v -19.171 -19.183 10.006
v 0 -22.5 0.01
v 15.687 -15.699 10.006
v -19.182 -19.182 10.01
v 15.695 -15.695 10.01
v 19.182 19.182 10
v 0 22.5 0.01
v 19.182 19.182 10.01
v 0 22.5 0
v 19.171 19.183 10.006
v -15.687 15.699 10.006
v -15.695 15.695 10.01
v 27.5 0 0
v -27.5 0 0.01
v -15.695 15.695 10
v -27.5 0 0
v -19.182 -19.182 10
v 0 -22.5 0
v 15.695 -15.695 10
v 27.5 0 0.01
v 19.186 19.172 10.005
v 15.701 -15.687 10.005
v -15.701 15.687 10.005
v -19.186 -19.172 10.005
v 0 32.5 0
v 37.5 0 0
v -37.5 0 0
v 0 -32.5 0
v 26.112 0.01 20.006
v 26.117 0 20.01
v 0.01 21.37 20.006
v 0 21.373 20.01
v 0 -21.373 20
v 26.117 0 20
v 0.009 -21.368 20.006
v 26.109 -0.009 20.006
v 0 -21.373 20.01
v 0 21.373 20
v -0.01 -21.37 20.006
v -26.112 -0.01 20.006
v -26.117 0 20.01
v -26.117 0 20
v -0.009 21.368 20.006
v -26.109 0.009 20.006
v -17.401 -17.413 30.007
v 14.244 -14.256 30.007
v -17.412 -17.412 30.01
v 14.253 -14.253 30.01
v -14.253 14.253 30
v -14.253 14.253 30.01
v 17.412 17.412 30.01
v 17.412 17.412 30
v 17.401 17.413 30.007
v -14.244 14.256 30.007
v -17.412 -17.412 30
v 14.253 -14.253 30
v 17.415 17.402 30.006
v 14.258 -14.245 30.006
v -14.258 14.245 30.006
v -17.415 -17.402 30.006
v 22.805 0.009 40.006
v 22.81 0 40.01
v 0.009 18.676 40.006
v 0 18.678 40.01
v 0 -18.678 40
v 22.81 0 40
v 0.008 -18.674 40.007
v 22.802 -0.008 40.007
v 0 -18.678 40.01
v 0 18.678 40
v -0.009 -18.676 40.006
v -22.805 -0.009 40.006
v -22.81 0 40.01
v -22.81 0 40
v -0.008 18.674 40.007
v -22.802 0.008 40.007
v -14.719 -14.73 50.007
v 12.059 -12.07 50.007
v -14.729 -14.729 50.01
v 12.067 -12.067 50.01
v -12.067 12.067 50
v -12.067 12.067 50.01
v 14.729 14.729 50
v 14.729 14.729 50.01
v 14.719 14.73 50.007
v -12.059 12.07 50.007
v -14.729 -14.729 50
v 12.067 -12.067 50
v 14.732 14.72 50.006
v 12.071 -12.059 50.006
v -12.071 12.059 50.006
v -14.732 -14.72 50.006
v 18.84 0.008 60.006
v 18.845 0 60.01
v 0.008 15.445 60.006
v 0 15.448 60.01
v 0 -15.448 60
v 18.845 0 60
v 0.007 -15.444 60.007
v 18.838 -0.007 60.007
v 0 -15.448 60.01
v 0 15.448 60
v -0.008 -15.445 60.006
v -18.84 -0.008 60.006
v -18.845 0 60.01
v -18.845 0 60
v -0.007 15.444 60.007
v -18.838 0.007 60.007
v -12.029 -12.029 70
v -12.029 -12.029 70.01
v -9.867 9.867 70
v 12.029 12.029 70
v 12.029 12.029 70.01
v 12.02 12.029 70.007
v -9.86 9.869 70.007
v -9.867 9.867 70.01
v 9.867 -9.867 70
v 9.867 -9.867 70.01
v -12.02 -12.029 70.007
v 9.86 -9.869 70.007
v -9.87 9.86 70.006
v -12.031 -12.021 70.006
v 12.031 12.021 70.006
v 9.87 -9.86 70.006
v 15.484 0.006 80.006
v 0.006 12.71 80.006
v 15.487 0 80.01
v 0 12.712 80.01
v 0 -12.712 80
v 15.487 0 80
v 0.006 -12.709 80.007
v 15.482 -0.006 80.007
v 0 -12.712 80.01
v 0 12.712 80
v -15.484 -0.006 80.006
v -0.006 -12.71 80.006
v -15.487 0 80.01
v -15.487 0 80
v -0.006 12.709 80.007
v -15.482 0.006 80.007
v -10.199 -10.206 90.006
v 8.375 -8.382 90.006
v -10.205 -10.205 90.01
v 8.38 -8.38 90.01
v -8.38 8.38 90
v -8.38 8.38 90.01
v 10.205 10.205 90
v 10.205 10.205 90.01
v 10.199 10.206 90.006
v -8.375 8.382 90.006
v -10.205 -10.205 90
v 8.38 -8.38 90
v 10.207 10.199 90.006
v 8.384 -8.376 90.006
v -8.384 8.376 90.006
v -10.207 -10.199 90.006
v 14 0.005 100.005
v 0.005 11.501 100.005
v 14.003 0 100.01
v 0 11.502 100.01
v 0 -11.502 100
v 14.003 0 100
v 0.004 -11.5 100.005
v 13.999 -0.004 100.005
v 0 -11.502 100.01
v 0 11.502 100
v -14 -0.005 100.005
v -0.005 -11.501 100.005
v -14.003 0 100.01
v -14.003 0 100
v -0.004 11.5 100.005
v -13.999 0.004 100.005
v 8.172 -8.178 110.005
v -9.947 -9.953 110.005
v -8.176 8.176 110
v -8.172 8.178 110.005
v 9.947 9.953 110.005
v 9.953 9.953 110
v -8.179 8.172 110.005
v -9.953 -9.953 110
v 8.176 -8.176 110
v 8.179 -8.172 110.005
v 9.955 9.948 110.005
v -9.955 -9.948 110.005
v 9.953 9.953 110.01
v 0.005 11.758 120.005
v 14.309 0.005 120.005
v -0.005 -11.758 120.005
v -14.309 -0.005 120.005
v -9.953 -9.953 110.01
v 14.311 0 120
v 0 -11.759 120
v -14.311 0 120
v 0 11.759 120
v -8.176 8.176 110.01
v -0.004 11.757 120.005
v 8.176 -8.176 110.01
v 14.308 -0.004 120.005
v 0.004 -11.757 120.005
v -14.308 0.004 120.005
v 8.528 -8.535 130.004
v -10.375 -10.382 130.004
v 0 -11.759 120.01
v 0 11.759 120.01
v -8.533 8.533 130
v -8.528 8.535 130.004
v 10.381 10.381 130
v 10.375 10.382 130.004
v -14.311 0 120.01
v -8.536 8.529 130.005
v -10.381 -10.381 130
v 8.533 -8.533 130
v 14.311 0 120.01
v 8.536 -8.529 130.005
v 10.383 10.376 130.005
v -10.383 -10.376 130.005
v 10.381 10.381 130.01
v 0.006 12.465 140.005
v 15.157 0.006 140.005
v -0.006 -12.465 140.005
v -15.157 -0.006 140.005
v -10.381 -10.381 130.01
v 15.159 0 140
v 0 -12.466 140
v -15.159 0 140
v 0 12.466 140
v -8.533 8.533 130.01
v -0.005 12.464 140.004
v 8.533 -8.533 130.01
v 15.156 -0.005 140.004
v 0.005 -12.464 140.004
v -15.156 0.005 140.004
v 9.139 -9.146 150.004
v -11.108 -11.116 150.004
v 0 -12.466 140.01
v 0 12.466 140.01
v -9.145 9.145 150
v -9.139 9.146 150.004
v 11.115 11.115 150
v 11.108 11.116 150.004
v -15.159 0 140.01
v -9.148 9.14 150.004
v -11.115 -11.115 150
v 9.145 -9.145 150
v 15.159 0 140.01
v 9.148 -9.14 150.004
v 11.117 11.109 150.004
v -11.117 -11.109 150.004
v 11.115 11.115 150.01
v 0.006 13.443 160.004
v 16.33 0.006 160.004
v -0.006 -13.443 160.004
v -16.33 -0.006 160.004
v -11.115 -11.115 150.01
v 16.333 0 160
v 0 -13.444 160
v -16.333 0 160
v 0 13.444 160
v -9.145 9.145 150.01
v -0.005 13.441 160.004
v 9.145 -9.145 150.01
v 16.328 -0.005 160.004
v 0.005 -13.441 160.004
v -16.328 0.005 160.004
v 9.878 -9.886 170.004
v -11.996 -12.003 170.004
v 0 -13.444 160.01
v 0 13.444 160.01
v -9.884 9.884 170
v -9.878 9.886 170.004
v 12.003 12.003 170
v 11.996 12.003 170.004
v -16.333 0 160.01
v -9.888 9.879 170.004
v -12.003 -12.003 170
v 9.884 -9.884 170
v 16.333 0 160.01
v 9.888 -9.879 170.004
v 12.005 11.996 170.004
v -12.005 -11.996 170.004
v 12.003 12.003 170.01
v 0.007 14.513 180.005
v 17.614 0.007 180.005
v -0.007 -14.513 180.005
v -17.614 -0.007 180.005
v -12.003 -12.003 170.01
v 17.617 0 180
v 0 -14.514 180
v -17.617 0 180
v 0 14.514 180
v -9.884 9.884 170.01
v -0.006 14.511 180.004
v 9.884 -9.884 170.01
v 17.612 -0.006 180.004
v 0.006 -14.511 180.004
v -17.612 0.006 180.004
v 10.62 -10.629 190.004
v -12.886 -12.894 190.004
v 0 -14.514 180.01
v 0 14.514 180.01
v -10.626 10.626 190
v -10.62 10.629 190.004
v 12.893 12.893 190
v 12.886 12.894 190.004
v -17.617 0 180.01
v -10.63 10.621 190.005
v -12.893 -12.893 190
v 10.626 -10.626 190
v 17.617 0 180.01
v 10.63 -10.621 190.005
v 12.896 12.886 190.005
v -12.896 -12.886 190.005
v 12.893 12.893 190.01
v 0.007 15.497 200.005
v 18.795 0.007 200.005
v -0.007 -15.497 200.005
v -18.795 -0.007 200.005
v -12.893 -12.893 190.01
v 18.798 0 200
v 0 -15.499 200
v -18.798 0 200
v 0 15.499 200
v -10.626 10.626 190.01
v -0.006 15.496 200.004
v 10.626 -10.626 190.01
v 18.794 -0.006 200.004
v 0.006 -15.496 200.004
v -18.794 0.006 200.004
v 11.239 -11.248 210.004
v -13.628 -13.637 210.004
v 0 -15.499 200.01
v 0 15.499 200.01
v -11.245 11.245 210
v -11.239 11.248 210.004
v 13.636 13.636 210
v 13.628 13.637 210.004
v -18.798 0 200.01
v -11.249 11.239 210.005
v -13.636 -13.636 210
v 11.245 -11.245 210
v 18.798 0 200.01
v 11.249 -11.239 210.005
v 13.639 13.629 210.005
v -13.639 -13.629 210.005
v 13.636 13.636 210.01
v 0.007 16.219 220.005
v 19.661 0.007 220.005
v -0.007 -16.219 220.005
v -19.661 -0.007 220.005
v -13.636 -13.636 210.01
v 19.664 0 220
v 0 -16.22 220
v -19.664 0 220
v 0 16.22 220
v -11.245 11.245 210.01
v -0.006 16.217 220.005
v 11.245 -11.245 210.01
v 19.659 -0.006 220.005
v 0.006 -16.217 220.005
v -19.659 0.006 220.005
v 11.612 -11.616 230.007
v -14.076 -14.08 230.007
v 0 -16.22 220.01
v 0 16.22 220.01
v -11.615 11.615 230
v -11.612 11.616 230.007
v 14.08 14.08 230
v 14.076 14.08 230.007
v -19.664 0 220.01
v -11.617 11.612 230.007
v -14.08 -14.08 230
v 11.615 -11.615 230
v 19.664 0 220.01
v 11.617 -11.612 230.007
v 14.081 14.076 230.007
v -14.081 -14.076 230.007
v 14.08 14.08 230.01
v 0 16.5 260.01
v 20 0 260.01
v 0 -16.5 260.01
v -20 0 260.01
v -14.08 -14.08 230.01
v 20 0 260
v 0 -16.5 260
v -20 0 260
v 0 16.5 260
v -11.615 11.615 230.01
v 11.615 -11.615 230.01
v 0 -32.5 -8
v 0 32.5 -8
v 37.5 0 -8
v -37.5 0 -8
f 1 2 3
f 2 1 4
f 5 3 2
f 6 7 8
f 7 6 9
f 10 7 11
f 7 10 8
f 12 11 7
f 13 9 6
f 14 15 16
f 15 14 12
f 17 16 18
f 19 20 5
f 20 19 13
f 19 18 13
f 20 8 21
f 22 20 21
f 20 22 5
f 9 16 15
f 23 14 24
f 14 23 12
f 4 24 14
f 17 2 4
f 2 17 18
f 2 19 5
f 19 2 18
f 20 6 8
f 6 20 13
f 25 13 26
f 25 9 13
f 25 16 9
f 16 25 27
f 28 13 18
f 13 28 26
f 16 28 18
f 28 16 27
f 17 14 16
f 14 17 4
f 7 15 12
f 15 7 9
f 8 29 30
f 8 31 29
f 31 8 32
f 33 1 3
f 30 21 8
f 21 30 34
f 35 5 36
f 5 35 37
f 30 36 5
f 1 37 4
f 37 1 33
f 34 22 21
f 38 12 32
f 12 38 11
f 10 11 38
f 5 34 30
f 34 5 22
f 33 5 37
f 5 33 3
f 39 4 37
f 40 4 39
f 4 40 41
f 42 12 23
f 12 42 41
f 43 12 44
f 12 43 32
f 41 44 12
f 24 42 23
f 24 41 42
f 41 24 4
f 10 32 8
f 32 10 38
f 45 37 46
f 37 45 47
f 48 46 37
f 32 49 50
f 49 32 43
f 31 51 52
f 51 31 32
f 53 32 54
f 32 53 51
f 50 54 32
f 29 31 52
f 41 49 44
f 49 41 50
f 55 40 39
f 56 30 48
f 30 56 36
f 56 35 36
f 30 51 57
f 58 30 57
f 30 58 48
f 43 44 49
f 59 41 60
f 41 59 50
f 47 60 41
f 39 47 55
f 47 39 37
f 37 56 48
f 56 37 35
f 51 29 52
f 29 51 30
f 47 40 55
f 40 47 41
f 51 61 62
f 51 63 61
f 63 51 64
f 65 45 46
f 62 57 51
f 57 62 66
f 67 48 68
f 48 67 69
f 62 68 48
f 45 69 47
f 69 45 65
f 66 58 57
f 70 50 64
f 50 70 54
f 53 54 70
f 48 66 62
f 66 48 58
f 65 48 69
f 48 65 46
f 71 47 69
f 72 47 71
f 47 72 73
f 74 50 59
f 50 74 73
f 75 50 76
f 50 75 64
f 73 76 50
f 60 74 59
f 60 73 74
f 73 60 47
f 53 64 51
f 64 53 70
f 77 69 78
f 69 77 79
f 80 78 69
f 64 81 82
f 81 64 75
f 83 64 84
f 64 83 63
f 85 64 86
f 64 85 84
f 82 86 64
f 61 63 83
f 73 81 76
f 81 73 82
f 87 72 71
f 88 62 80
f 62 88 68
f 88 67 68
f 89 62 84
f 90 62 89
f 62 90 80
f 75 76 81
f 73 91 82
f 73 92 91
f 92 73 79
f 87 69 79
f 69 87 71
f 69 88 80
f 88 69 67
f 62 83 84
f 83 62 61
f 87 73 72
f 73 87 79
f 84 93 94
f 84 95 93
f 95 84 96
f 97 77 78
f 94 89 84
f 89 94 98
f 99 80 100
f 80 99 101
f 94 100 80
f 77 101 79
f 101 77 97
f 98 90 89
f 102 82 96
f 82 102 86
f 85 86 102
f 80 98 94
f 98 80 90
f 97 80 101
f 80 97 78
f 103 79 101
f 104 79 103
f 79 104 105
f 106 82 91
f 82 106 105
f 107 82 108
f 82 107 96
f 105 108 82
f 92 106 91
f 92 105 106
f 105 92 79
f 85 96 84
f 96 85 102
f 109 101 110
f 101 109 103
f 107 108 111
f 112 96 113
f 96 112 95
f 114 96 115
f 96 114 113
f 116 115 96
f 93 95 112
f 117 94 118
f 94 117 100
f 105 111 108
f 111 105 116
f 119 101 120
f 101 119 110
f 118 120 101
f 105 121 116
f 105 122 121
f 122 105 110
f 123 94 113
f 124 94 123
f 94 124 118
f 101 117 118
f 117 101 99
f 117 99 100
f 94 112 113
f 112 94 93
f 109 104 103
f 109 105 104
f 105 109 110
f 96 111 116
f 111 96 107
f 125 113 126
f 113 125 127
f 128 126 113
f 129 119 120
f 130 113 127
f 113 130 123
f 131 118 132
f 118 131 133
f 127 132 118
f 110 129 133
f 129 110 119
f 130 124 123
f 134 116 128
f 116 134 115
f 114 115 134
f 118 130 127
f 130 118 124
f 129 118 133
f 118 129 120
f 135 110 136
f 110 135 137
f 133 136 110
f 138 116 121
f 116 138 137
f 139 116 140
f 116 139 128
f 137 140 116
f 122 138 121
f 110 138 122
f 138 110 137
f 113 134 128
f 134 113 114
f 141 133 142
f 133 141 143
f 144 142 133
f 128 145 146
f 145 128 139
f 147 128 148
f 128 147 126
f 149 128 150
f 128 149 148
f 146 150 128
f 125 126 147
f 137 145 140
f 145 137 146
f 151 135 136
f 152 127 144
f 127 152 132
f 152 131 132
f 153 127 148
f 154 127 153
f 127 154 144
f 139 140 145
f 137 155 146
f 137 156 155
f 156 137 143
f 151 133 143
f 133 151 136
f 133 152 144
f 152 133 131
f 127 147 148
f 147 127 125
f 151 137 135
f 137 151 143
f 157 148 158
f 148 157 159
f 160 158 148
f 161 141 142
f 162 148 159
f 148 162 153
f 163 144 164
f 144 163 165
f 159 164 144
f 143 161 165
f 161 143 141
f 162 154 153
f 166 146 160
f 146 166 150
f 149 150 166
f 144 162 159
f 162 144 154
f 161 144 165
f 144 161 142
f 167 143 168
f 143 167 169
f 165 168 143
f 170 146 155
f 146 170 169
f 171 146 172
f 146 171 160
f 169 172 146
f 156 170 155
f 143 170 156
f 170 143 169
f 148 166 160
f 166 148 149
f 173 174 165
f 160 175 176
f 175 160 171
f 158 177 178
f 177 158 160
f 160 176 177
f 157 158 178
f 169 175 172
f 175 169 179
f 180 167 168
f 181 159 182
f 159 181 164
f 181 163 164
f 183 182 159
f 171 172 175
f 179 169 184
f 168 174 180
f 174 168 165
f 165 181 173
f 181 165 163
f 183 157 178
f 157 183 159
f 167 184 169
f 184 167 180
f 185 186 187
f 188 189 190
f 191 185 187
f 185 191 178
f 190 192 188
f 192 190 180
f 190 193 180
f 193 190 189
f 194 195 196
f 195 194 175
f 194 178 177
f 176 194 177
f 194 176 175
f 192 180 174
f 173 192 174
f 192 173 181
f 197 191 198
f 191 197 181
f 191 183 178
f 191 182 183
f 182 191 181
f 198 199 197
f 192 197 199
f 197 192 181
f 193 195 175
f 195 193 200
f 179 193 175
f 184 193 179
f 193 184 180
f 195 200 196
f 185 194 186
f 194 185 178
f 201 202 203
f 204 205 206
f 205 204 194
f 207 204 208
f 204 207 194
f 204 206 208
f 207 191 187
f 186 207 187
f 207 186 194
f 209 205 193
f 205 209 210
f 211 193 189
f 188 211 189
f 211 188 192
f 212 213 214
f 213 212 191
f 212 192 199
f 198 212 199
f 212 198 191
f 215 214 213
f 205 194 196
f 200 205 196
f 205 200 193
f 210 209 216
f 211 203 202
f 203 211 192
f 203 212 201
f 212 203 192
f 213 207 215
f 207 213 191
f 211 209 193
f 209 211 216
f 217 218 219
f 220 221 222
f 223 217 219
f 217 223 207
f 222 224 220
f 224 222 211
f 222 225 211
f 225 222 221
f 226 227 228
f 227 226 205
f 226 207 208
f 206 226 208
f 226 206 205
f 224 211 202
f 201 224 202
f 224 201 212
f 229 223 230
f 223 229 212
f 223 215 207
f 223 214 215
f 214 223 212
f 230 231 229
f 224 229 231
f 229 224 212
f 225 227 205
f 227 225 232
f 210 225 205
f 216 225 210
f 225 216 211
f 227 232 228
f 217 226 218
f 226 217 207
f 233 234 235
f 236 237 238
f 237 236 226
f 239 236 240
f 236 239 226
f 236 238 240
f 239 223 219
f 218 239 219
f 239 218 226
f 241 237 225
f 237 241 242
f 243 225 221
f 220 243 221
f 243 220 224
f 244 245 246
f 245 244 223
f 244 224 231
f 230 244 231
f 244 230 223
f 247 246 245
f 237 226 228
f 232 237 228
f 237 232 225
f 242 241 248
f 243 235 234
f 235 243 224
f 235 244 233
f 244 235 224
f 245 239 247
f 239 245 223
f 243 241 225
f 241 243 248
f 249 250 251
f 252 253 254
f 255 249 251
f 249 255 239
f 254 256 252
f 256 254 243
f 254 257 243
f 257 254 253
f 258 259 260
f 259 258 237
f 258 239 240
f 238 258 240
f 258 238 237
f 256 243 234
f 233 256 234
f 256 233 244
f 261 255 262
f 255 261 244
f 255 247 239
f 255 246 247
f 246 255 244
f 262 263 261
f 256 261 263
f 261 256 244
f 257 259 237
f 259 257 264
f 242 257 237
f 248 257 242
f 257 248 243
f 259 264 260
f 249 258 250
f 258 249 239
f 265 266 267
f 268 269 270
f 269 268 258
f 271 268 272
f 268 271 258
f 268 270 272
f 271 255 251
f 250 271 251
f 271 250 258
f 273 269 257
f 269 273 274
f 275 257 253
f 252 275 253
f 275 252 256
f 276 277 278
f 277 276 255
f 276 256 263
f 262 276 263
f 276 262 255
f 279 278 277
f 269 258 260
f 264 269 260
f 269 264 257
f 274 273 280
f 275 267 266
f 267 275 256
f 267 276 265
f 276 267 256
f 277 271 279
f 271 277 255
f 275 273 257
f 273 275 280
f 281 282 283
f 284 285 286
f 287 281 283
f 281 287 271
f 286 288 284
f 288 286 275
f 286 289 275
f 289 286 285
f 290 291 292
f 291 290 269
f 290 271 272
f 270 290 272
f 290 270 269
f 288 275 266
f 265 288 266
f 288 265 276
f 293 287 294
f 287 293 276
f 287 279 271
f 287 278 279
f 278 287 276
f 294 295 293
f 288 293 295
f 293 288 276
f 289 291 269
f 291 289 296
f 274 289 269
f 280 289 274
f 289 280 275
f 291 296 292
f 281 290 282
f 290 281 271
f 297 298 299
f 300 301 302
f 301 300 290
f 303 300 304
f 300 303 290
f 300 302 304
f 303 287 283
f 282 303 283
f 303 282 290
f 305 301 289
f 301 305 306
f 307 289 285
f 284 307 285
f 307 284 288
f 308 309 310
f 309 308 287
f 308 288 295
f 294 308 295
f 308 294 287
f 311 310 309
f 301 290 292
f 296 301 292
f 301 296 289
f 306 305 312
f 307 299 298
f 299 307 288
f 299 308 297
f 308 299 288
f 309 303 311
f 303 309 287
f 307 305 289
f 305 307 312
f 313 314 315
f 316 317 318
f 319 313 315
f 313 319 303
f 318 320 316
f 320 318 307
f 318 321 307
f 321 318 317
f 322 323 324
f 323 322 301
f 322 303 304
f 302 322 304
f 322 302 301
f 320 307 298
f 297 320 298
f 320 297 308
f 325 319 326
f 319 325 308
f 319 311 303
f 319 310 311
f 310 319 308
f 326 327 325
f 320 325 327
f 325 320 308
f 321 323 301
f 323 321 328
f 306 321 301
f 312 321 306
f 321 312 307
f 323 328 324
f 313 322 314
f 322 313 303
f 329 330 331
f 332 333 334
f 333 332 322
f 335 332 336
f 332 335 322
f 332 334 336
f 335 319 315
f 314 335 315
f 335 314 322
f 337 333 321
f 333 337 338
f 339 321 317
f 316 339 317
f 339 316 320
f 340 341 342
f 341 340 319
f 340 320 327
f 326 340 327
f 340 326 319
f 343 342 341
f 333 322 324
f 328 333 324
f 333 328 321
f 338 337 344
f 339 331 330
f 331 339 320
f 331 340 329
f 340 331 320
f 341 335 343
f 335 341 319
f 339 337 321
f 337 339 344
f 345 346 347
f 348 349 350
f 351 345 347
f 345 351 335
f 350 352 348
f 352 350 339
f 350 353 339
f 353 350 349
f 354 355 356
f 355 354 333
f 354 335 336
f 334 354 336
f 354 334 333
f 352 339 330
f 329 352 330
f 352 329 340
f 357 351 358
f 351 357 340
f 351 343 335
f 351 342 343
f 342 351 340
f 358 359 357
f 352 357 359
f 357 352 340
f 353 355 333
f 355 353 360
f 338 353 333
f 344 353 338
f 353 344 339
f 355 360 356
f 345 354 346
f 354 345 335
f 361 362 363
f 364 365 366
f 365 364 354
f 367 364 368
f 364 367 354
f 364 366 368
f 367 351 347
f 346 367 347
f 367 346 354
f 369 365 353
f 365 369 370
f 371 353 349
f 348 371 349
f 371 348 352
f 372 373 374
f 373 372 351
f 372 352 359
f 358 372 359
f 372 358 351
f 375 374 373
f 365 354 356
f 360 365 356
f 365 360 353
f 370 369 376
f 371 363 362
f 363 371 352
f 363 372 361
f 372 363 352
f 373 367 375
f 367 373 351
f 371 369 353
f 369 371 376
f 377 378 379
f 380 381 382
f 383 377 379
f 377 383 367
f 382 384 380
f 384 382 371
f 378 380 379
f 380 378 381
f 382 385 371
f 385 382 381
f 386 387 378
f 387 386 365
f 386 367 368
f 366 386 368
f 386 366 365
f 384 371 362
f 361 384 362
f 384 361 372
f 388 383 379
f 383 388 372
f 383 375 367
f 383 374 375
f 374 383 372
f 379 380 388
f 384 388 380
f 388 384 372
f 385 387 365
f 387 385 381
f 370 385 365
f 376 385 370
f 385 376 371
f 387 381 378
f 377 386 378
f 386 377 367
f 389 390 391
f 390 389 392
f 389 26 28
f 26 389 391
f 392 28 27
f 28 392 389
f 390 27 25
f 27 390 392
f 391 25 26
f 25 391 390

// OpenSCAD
// ============================================
// Columna facetada - estilo Gaudí
// Alto: 240mm, encaja en base de 60x50mm
// Sólida, con cintura, facetas triangulares
// ============================================

/* [Columna] */
total_h   = 240;  // Altura total (mm) [50:10:500]
base_w    = 55;   // Ancho base (mm) [10:1:150]
base_d    = 45;   // Profundidad base (mm) [10:1:150]
top_w     = 40;   // Ancho arriba (mm) [10:1:150]
top_d     = 33;   // Profundidad arriba (mm) [10:1:150]
waist_w   = 28;   // Ancho cintura (mm) [10:1:150]
waist_d   = 23;   // Profundidad cintura (mm) [10:1:150]
waist_pos = 0.42; // Posición cintura [0:0.01:1]
sections  = 24;   // Secciones (más = más suave) [8:1:64]

/* [Base] */
plinth_w = 75;  // Ancho de la base (mm) [10:1:200]
plinth_d = 65;  // Profundidad de la base (mm) [10:1:200]
plinth_h = 8;   // Altura de la base (mm) [2:1:30]

// --- Perfil ---
function smooth(t) = t * t * (3 - 2 * t);

function profile_w(t) =
    t <= waist_pos
        ? base_w + (waist_w - base_w) * smooth(t / waist_pos)
        : waist_w + (top_w - waist_w) * smooth((t - waist_pos) / (1 - waist_pos));

function profile_d(t) =
    t <= waist_pos
        ? base_d + (waist_d - base_d) * smooth(t / waist_pos)
        : waist_d + (top_d - waist_d) * smooth((t - waist_pos) / (1 - waist_pos));

module faceted_column() {
    for (i = [0 : sections - 1]) {
        t0 = i / sections;
        t1 = (i + 1) / sections;
        z0 = t0 * total_h;
        z1 = i == sections -1 ? (t1 * total_h)+20    : t1 * total_h;
        w0 = profile_w(t0) / 2;
        d0 = profile_d(t0) / 2;
        w1 = profile_w(t1) / 2;
        d1 = profile_d(t1) / 2;

        rot0 = (i % 2 == 0) ? 0 : 45;
        rot1 = (i % 2 == 0) ? 45 : 0;

        hull() {
            translate([0, 0, z0])
                rotate([0, 0, rot0])
                    scale([w0, d0, 1])
                        cylinder(h = 0.01, r = 1, $fn = 4);

            translate([0, 0, z1])
                rotate([0, 0, rot1])
                    scale([w1, d1, 1])
                        cylinder(h = 0.01, r = 1, $fn = 4);
        }
    }
}

module square_base() {
    hw = plinth_w / 2;
    hd = plinth_d / 2;
    translate([0, 0, -plinth_h])
        linear_extrude(height = plinth_h)
            polygon([[hw,0],[0,hd],[-hw,0],[0,-hd]]);
}

// --- Render ---
square_base();
faceted_column();

// ============================================
// NOTAS:
// - Base: ~55x45mm → encaja en caja 60x50mm
// - Imprimir vertical (base abajo)
// - Layer height: 0.2mm, infill 15% suficiente
// - No necesita soportes
// - Si quieres ajustar la cintura: cambia waist_pos
//   (0.3 = más abajo, 0.5 = centro exacto)
// ============================================
